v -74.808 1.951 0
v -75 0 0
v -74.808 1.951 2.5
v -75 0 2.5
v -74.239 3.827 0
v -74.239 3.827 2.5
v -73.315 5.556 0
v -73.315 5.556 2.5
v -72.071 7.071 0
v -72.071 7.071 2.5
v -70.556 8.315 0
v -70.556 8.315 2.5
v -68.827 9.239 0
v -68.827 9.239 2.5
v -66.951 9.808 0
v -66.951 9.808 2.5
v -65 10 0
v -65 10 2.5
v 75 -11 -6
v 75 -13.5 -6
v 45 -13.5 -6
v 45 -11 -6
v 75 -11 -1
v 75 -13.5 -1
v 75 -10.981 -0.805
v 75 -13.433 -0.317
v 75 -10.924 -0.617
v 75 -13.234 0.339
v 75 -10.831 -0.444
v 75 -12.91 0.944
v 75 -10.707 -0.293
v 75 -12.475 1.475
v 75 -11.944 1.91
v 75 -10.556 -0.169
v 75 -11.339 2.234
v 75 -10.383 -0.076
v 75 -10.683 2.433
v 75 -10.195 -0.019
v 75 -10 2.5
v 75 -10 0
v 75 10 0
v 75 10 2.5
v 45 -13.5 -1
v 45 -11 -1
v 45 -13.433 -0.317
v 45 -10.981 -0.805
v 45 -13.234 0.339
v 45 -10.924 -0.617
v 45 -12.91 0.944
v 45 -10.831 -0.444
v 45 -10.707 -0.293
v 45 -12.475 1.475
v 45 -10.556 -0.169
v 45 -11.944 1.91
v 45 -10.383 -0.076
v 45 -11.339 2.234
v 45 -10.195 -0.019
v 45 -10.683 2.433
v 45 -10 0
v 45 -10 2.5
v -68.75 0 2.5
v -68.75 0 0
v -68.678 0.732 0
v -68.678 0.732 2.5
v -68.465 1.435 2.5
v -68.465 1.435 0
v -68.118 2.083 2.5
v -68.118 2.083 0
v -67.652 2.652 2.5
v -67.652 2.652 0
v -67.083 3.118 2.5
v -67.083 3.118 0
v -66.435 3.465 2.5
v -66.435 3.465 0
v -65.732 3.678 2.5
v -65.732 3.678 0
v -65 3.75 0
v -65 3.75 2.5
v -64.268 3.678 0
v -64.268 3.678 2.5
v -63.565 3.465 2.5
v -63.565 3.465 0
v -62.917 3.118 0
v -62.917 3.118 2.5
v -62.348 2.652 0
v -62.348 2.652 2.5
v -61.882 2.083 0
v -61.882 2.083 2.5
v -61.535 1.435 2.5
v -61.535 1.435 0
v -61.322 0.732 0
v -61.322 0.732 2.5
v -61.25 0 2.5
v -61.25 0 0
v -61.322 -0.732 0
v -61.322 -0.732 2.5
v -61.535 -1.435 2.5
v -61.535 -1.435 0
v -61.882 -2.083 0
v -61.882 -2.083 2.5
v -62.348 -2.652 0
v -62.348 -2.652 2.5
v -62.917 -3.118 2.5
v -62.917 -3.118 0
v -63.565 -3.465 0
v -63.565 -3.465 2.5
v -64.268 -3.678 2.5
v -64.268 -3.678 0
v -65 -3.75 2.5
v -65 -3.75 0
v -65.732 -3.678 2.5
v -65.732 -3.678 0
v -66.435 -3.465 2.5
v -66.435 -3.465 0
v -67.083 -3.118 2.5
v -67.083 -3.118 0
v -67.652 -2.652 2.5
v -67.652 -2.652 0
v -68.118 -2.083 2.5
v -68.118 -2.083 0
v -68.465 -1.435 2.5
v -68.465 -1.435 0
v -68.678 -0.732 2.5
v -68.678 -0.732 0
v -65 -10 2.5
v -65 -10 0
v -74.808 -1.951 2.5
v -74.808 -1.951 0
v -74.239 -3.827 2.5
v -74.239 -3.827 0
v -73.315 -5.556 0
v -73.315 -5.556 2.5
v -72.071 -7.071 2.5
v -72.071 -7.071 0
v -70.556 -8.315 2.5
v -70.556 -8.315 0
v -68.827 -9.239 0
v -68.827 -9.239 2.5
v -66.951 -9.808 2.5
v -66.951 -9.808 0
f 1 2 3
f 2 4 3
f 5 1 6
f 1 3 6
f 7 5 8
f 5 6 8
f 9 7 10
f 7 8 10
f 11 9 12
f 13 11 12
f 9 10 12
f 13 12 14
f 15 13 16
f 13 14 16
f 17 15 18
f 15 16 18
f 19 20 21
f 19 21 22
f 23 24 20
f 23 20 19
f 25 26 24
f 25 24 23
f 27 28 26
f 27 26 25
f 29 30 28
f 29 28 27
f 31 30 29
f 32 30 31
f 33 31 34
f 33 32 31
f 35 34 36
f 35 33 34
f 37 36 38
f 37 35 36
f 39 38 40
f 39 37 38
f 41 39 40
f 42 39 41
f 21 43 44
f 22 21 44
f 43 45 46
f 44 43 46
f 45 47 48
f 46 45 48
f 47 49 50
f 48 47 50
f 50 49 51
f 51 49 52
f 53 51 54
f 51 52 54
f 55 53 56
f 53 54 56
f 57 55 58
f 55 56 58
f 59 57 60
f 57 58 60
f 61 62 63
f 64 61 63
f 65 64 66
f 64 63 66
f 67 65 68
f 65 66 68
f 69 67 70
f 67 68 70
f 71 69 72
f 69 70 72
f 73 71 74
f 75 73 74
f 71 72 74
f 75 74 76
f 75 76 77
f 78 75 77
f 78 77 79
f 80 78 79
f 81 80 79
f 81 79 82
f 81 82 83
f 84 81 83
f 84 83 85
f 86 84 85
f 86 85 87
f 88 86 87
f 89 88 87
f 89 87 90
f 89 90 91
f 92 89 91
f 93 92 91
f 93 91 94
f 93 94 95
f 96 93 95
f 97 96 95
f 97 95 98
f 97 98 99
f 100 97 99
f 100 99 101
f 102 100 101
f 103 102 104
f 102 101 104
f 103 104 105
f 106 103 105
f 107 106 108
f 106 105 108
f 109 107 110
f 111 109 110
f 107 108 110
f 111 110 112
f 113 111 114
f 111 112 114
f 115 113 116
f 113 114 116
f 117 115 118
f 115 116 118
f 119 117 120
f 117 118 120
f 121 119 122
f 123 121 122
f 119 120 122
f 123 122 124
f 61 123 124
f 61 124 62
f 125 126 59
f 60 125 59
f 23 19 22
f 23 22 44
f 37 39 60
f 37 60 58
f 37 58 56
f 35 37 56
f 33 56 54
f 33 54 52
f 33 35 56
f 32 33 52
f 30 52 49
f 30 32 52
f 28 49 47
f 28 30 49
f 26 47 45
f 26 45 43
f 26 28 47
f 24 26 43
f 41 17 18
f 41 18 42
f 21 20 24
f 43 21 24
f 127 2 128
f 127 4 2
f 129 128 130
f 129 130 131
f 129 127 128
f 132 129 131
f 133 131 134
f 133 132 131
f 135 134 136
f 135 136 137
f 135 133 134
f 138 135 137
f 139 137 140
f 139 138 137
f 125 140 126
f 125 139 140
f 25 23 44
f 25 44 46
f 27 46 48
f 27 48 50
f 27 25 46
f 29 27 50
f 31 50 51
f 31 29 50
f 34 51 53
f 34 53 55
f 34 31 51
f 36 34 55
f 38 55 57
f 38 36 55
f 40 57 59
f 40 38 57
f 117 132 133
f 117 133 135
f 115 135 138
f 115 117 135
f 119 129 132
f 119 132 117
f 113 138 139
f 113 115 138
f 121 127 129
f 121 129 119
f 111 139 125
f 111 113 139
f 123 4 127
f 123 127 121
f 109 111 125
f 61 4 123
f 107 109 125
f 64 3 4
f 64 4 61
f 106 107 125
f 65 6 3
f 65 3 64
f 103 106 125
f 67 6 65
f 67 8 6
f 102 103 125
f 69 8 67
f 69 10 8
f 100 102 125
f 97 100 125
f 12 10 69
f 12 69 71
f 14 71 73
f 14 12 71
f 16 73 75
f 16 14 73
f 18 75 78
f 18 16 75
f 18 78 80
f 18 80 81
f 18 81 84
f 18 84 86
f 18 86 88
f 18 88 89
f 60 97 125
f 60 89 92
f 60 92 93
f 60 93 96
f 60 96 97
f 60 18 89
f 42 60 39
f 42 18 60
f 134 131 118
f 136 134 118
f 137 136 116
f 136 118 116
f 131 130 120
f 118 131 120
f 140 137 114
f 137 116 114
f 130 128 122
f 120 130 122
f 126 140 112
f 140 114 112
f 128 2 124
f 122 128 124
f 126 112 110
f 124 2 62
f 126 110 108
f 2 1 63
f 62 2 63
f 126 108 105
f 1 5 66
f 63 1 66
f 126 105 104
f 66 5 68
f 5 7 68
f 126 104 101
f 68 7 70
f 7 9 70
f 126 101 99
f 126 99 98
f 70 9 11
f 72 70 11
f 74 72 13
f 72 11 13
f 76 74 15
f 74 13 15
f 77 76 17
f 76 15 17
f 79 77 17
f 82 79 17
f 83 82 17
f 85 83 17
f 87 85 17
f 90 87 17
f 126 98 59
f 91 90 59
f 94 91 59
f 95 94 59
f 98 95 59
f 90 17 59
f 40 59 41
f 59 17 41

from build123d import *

# Parameters (mm, degrees)
F0_W     = 150
F0_H     = 20
F1_DEPTH = 2.5
F3_D     = 7.5
F4_R     = 9.99999
F5_W     = 2.5
F5_H     = 5
F6_DEPTH = 30


# Not quite as in the source:
# - a fillet or chamfer is up to 0.001 mm smaller than in the source, because OpenCascade refuses the exact size


with BuildPart() as f1:
    # F0 (on Top) → F1 (new body)
    with BuildSketch(Plane.XY):
        Rectangle(F0_W, F0_H)
    extrude(amount=F1_DEPTH)

    # F3 (through all)
    with Locations(Plane.XY.offset(2.5)):
        with Locations((-65, 0)):
            Hole(F3_D / 2)

    # F4 (radius 10 in the source; OpenCascade refuses exactly that, so slightly less here)
    f4_edges = [f1.edges().sort_by_distance(p)[0] for p in [
        (-75, -10, 1.25),
        (-75, 10, 1.25),
    ]]
    fillet(f4_edges, radius=F4_R)

    # F5 (on face) → F6 (join)
    with BuildSketch(Plane.YZ.offset(75)):
        with BuildLine():
            Line((-10, 0), (-10, 2.5))
            ThreePointArc((-10, 2.5), (-12.4748737342, 1.4748737342), (-13.5, -1))
            Line((-13.5, -1), (-11, -1))
            ThreePointArc((-11, -1), (-10.7071067812, -0.2928932188), (-10, 0))
        make_face()
        with Locations((-12.25, -3.5)):
            Rectangle(F5_W, F5_H)
    extrude(amount=-F6_DEPTH)


solid = f1.part
